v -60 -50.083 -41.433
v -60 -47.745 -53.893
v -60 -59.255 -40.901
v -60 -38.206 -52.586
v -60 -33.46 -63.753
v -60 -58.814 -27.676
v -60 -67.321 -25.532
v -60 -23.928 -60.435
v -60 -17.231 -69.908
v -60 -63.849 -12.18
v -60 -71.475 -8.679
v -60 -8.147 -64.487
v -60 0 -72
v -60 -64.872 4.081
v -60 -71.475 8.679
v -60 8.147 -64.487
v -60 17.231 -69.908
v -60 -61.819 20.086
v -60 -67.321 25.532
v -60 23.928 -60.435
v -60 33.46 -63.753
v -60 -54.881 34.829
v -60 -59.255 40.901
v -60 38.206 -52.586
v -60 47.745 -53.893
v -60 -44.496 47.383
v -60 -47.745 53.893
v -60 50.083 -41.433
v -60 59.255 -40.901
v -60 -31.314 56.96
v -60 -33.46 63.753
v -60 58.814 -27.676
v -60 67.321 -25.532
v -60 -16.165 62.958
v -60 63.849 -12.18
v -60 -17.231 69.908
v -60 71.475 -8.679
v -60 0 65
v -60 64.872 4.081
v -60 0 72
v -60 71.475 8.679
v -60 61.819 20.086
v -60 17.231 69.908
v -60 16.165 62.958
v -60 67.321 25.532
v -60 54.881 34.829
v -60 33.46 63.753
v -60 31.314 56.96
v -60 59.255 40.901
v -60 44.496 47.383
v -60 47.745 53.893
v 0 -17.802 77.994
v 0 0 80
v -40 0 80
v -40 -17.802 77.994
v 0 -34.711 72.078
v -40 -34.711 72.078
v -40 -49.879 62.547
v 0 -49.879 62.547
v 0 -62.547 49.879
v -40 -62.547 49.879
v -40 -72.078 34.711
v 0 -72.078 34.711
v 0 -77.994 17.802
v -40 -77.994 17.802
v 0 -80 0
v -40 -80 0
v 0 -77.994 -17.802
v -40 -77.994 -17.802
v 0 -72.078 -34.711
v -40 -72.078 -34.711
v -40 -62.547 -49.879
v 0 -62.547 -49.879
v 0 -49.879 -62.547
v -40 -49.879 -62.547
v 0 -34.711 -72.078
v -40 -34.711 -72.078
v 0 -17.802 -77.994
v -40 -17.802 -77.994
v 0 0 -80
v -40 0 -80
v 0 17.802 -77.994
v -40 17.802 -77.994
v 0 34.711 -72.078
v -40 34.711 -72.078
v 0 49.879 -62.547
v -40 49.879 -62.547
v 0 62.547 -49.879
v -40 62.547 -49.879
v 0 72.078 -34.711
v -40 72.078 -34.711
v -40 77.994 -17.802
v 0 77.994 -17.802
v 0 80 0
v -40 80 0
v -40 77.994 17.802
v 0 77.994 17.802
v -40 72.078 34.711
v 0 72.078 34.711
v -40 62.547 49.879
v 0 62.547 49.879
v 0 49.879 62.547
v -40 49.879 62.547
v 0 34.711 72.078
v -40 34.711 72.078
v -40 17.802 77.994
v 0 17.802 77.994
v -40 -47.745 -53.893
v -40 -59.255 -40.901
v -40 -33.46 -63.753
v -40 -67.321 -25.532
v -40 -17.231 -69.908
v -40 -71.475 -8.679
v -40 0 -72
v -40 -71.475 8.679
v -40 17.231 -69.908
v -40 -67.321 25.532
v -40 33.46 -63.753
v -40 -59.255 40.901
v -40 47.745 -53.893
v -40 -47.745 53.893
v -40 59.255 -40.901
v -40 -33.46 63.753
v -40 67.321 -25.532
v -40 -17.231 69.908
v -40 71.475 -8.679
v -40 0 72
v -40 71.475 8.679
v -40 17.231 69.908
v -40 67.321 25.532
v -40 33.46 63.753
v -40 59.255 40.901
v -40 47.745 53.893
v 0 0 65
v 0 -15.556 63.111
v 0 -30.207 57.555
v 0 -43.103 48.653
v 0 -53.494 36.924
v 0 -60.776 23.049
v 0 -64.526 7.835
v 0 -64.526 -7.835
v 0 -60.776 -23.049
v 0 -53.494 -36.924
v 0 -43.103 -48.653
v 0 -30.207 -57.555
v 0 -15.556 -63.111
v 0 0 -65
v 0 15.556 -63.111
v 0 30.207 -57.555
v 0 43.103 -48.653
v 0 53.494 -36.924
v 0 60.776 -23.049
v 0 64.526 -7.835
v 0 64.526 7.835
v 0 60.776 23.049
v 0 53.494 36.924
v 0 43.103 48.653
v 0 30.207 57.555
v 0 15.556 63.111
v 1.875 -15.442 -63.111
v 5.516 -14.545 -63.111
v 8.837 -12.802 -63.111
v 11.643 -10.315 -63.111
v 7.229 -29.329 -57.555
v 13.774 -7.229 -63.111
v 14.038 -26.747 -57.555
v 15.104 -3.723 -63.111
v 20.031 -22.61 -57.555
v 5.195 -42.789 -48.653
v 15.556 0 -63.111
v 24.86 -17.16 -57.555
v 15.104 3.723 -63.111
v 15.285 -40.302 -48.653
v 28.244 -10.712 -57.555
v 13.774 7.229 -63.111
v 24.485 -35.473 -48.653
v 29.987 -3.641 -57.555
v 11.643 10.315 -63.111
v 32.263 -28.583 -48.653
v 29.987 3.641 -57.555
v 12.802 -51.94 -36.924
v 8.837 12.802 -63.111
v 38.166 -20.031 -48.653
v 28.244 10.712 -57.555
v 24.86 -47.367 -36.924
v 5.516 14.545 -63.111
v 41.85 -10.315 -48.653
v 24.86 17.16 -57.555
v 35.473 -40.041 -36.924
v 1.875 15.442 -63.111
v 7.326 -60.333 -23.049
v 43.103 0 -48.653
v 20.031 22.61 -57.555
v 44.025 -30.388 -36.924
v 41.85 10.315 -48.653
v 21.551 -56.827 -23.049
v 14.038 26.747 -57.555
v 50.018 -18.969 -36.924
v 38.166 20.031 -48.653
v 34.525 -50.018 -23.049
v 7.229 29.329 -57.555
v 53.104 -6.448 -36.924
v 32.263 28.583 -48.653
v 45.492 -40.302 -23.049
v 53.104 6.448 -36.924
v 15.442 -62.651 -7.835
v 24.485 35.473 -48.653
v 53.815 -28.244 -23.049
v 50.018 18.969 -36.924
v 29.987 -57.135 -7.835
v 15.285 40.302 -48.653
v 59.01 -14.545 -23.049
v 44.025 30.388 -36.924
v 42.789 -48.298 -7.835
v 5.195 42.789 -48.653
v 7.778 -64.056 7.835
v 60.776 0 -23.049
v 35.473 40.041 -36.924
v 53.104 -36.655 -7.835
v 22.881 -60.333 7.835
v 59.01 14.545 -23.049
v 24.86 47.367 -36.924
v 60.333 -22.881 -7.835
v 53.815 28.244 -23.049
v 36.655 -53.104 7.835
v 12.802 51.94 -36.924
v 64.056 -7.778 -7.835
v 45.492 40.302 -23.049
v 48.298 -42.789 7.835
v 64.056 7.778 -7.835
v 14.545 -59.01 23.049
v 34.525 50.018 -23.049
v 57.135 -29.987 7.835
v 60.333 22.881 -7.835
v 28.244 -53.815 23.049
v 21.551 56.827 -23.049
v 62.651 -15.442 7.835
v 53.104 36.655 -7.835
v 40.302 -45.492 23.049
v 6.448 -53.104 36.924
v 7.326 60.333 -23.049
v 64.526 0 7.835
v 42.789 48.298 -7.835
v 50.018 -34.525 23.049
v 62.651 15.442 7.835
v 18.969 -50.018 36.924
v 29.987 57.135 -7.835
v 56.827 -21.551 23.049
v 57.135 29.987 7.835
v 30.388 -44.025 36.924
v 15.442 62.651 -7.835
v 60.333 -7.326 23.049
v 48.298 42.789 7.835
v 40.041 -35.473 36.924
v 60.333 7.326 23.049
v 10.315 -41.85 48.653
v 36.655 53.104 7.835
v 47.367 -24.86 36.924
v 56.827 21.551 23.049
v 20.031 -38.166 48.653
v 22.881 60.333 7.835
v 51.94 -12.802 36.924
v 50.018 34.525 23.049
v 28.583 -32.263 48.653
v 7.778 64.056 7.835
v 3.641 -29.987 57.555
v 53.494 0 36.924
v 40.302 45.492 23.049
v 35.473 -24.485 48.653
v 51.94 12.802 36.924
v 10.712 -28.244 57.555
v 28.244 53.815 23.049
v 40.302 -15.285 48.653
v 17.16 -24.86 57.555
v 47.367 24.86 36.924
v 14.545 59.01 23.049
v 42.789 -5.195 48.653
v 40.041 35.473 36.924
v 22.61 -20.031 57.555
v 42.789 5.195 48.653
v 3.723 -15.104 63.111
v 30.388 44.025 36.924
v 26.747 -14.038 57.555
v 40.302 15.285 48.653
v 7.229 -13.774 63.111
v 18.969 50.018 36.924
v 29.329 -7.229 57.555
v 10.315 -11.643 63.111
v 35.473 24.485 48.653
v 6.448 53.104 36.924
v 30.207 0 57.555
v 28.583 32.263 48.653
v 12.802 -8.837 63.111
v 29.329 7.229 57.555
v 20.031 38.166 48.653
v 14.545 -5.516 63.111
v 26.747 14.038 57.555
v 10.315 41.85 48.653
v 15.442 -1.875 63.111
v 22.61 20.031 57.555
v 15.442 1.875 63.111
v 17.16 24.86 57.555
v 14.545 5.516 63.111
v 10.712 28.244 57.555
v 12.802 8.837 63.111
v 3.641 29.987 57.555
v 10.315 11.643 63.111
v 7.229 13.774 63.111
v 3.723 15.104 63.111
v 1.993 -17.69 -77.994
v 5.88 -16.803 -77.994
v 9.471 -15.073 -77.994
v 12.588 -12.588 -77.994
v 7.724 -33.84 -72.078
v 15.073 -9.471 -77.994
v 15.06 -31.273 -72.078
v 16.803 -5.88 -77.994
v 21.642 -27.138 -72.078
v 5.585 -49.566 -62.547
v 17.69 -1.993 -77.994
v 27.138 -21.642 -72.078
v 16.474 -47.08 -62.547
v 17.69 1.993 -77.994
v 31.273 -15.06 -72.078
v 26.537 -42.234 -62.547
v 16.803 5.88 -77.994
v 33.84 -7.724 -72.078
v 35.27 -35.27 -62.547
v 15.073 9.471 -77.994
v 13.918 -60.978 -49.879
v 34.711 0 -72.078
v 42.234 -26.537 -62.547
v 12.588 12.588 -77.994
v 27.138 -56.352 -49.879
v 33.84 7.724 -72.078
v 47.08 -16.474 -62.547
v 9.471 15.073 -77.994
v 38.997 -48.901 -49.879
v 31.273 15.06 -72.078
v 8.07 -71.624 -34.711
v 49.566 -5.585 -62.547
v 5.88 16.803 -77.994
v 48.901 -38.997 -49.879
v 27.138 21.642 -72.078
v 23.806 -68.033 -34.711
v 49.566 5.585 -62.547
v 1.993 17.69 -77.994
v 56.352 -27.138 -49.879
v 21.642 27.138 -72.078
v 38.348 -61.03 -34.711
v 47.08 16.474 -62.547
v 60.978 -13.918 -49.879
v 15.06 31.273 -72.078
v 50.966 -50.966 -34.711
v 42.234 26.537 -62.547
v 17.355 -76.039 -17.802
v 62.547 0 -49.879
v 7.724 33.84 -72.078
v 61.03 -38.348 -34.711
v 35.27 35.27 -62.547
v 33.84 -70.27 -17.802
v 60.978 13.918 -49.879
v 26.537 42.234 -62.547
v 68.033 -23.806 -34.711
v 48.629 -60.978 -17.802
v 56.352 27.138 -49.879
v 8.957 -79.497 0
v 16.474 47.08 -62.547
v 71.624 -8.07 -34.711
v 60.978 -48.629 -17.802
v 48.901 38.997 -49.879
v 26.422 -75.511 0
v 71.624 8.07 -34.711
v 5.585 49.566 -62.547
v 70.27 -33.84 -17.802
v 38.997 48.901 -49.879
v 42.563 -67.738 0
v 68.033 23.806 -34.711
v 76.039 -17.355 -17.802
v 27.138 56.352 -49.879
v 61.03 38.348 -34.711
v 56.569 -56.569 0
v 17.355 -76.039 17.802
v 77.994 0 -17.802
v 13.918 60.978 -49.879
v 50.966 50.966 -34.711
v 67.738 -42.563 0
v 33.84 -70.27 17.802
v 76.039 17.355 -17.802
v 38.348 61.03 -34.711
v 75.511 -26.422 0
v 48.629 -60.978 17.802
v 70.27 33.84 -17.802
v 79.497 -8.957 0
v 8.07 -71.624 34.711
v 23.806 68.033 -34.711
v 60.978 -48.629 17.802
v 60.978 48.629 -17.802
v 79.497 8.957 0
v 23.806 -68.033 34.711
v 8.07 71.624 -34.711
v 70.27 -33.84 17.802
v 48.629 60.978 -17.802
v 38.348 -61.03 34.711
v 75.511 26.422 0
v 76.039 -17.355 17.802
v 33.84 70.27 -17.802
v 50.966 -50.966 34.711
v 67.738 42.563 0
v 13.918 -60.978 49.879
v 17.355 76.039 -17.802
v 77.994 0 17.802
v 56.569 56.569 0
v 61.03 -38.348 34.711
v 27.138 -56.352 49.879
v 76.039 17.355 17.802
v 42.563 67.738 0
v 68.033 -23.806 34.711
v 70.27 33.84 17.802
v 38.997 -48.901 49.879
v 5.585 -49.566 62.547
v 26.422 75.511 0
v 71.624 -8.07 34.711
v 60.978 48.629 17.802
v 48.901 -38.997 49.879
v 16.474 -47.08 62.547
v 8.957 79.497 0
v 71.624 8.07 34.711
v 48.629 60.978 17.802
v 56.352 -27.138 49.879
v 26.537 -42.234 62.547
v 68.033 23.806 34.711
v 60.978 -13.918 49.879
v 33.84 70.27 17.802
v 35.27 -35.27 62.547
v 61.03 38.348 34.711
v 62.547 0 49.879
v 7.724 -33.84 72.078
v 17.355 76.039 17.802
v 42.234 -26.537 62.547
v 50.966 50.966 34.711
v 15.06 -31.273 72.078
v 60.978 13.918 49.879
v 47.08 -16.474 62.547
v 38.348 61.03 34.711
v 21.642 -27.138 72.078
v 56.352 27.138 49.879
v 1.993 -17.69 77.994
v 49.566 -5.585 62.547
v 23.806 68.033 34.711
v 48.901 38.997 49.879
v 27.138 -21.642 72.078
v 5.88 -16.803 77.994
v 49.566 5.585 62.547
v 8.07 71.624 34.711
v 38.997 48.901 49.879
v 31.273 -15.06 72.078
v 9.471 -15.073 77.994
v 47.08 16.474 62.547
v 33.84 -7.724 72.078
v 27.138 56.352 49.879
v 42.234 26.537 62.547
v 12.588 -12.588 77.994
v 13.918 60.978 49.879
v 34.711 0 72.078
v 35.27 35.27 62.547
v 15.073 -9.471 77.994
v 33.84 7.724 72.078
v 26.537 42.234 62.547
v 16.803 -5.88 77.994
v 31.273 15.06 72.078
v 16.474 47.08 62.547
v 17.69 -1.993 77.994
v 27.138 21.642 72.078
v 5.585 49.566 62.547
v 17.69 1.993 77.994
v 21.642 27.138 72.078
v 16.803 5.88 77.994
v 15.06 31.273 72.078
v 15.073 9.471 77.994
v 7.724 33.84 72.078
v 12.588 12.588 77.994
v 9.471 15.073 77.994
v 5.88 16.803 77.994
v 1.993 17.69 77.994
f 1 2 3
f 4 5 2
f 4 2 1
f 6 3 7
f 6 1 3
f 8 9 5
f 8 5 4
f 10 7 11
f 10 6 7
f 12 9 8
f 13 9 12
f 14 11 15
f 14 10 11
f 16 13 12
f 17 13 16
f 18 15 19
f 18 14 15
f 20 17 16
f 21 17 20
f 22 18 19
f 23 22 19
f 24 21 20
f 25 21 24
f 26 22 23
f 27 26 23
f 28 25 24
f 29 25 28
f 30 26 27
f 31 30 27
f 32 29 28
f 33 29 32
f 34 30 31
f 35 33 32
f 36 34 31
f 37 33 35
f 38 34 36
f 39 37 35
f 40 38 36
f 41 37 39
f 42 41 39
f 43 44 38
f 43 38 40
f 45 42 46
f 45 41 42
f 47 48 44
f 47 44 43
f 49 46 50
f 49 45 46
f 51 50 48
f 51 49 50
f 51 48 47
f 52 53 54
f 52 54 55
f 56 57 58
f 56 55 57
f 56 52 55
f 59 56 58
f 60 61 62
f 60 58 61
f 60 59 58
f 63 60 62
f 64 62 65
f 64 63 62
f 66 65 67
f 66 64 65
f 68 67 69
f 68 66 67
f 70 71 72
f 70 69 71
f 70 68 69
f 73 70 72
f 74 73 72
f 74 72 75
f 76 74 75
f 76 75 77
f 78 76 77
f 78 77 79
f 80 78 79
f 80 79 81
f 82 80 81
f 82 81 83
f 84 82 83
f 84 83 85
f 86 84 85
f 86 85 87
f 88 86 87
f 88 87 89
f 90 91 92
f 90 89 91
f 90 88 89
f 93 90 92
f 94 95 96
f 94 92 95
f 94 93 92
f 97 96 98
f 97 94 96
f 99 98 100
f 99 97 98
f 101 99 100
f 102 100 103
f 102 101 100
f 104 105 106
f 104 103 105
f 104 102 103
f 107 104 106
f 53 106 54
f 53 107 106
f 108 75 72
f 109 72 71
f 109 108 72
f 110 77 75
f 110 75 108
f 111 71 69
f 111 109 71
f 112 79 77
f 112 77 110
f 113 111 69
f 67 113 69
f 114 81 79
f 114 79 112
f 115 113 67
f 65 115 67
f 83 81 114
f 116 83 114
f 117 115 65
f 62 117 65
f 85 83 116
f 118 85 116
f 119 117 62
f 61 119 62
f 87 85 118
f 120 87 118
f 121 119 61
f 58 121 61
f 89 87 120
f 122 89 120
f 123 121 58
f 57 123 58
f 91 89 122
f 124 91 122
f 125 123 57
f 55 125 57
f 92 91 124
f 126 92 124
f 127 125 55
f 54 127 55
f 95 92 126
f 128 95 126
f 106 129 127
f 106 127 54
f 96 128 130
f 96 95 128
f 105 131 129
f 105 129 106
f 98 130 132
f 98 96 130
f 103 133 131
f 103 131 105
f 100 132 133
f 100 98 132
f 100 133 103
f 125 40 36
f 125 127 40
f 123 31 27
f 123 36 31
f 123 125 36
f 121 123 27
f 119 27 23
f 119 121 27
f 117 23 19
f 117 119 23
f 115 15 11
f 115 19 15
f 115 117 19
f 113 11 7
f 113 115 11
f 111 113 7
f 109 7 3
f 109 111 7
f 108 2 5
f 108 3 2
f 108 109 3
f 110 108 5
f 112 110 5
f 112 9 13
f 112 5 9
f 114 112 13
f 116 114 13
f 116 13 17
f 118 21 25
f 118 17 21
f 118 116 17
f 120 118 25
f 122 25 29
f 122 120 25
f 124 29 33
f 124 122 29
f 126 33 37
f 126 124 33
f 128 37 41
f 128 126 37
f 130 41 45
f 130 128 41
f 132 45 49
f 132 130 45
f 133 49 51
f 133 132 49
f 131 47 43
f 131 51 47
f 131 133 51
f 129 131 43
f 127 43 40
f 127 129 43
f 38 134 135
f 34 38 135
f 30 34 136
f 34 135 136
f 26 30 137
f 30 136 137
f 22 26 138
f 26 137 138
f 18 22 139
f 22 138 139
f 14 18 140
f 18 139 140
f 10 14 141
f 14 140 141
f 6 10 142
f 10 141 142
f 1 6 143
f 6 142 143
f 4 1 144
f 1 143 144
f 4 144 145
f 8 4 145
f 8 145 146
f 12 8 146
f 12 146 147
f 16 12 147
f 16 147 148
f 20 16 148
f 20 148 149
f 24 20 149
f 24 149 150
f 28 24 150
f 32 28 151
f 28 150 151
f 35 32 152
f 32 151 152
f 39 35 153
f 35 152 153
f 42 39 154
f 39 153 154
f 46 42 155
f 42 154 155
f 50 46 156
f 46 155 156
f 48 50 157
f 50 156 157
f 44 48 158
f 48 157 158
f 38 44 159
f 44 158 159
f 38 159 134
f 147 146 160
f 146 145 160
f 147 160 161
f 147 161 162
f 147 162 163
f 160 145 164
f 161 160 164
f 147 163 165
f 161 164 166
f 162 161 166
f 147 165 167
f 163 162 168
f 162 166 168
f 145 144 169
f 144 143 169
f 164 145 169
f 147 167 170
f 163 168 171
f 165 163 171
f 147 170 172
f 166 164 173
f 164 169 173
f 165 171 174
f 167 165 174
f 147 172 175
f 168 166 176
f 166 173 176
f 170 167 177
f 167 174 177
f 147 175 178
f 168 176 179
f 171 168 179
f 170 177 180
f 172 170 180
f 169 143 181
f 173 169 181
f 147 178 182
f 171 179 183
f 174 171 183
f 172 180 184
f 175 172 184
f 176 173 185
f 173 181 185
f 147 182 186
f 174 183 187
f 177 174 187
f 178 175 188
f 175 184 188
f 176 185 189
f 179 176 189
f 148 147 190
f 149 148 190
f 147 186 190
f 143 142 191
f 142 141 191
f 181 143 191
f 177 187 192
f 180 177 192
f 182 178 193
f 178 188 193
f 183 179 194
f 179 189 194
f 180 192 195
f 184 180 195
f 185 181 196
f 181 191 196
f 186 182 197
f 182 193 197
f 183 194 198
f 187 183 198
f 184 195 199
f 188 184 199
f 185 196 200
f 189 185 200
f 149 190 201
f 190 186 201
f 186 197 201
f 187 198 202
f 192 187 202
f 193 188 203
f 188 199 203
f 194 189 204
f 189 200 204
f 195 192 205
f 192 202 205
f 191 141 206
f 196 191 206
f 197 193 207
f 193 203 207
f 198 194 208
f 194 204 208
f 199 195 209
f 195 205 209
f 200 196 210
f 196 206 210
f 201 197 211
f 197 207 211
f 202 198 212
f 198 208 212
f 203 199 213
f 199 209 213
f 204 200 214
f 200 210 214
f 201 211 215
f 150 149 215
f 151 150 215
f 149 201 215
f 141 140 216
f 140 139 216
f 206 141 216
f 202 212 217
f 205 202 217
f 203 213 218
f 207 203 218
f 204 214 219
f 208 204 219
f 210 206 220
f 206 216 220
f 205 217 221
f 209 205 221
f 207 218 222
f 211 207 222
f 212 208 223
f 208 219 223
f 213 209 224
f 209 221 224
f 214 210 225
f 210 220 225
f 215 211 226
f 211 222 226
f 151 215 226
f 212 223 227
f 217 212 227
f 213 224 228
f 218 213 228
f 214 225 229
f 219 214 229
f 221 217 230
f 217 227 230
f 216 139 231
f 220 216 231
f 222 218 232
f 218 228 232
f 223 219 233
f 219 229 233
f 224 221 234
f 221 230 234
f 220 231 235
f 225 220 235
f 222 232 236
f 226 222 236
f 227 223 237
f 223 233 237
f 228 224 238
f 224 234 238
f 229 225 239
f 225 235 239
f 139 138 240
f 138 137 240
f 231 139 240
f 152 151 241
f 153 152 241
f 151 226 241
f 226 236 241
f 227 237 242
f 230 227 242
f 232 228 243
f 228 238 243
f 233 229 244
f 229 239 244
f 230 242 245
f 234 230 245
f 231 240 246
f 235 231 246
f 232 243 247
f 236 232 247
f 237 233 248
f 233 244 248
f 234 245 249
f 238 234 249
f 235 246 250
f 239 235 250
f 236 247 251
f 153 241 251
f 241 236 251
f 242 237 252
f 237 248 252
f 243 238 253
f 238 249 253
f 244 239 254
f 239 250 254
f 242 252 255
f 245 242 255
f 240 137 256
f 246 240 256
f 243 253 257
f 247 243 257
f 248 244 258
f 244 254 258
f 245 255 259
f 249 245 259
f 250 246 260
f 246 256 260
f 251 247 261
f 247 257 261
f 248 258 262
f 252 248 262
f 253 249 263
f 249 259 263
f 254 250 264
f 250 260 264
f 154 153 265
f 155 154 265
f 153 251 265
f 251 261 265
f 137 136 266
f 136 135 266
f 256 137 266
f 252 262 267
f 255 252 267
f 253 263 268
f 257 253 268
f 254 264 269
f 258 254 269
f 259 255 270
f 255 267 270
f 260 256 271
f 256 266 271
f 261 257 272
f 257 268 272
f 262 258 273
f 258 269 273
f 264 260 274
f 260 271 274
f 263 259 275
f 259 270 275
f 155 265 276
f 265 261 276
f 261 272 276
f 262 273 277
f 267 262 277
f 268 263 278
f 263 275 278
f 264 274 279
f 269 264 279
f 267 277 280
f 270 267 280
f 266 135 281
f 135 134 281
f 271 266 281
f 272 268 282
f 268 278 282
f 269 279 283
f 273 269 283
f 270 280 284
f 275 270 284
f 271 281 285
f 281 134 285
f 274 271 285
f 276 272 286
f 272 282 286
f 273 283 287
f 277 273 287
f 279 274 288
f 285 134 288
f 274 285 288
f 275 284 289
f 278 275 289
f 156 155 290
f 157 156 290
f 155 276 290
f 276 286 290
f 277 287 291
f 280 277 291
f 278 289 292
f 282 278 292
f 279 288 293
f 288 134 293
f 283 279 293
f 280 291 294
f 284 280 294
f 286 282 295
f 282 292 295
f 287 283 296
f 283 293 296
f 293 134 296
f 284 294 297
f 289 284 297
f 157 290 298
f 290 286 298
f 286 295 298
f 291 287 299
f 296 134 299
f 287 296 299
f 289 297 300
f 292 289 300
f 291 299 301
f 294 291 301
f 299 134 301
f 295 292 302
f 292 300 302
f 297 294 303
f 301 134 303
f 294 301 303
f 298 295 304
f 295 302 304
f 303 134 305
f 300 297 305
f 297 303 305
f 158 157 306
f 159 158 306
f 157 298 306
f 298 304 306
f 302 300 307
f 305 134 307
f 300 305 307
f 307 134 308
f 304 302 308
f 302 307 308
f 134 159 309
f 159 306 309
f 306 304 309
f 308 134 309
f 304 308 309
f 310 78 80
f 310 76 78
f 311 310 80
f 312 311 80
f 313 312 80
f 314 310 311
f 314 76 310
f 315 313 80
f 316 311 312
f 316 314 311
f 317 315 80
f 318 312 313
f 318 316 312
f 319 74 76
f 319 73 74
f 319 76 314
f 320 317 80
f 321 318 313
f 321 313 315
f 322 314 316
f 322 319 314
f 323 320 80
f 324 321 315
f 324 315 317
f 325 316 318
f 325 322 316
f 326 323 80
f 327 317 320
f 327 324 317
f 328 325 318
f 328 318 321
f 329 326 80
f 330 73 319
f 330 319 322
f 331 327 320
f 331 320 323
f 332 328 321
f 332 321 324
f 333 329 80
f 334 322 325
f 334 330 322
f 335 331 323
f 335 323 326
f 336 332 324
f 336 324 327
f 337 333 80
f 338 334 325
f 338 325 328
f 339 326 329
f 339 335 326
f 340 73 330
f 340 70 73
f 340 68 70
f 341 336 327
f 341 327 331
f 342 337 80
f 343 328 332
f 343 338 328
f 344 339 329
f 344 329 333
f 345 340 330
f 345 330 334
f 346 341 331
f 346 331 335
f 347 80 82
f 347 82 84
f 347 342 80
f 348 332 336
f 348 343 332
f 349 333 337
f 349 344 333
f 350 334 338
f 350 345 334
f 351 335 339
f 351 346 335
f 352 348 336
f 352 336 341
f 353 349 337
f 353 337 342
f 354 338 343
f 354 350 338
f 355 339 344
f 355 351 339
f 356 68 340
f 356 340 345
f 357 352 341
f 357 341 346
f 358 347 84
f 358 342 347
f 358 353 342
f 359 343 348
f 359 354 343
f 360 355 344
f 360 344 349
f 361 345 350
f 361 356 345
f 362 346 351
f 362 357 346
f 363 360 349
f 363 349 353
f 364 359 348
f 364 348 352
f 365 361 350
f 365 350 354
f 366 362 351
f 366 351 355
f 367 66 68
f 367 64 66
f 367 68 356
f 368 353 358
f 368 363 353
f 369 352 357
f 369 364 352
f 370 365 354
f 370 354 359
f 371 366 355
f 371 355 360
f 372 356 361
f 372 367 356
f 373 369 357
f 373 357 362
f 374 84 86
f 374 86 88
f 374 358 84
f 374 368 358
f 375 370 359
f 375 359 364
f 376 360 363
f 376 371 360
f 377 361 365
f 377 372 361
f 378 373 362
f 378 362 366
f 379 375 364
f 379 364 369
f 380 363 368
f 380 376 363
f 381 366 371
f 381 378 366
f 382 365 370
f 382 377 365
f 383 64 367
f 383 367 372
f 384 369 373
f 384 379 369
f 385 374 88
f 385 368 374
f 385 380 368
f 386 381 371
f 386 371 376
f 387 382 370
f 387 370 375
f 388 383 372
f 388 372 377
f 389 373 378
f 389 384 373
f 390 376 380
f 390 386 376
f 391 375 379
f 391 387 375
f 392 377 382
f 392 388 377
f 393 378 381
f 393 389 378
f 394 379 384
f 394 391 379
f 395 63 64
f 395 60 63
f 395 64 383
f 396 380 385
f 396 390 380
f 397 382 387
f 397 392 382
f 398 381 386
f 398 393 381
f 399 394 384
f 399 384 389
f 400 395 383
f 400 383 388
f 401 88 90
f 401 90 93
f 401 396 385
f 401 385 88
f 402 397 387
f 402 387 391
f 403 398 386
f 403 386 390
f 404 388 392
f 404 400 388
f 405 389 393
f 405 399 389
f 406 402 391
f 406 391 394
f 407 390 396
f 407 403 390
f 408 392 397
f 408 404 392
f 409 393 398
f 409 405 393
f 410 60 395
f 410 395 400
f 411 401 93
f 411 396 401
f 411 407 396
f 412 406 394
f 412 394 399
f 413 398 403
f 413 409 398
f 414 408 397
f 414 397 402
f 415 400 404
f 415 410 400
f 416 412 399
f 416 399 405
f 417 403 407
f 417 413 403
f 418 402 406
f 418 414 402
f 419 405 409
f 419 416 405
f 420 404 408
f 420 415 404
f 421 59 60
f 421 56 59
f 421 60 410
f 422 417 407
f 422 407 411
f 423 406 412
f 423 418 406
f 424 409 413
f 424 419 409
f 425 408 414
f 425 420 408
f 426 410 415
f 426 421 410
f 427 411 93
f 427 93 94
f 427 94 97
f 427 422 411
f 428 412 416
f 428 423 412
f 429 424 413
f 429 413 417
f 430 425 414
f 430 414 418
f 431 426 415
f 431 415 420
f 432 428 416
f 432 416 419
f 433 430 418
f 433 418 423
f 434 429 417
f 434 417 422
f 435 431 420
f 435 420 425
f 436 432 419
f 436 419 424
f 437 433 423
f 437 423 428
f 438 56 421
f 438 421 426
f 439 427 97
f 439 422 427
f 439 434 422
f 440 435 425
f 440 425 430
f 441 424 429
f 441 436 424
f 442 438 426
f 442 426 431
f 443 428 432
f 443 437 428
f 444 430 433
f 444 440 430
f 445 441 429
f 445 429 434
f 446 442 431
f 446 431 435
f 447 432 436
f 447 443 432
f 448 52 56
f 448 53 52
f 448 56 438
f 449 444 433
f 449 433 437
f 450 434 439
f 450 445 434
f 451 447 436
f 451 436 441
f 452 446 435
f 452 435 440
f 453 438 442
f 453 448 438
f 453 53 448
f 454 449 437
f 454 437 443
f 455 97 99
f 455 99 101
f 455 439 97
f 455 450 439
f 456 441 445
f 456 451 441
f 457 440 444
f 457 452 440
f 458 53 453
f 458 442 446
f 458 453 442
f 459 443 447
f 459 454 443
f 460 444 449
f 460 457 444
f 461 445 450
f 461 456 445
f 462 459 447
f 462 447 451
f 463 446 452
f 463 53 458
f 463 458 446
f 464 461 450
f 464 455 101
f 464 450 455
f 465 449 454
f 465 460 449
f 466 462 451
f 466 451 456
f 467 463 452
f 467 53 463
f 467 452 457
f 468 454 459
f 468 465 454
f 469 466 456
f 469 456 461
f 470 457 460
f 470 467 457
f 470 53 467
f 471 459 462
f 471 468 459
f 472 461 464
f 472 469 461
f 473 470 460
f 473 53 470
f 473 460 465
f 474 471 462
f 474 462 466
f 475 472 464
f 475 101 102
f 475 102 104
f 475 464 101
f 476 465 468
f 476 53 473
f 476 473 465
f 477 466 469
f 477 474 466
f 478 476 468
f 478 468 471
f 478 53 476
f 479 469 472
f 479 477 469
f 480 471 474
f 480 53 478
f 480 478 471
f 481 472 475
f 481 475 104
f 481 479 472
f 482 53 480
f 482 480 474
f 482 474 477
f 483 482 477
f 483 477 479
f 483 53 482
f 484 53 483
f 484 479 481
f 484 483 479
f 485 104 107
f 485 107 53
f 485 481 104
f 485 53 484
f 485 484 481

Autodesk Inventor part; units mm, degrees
ref_plane "YZ Plane" through (0, 0, 0) normal (1, 0, 0) x (0, 1, 0)
ref_plane "XZ Plane" through (0, 0, 0) normal (0, 1, 0) x (-1, 0, 0)
ref_plane "XY Plane" through (0, 0, 0) normal (0, 0, 1) x (1, 0, 0)
sketch "Sketch1" plane through (0, 0, 0) normal (1, 0, 0) x (0, 1, 0)
  arc A0 (0, -80) -> (0, 80) centre (0, 0) ccw
  arc A1 (0, -65) -> (0, 65) centre (0, 0) ccw
  line L0 (0, 80) -> (0, 65)
  line L1 (0, -65) -> (0, -80)
  dimension "d0" = 160
  dimension "d1" = 130
revolve "Revolution1" add sketch "Sketch1" angle 180 about axis through (0, 0, 80) along (0, 0, -1)
sketch "Sketch2" plane through (0, 0, 0) normal (-1, 0, 0) x (0, 0, 1)
  circle A0 centre (0, 0) radius 80
  circle A1 centre (0, 0) radius 65
extrude "Extrusion1" add sketch "Sketch2" along normal blind 40
sketch "Sketch4" plane through (-40, 0, 0) normal (-1, 0, 0) x (0, 0, 1)
  circle A0 centre (0, 0) radius 65
  circle A1 centre (0, 0) radius 72
  dimension "d8" = 144
  dimension "d9" = 130
extrude "Extrusion3" add sketch "Sketch4" along normal blind 20
thread "Thread1" size "M50x4" class "6g" standard "ANSI Metric M Profile" length 20
properties part number "Bacteria Membrane Half 2"
